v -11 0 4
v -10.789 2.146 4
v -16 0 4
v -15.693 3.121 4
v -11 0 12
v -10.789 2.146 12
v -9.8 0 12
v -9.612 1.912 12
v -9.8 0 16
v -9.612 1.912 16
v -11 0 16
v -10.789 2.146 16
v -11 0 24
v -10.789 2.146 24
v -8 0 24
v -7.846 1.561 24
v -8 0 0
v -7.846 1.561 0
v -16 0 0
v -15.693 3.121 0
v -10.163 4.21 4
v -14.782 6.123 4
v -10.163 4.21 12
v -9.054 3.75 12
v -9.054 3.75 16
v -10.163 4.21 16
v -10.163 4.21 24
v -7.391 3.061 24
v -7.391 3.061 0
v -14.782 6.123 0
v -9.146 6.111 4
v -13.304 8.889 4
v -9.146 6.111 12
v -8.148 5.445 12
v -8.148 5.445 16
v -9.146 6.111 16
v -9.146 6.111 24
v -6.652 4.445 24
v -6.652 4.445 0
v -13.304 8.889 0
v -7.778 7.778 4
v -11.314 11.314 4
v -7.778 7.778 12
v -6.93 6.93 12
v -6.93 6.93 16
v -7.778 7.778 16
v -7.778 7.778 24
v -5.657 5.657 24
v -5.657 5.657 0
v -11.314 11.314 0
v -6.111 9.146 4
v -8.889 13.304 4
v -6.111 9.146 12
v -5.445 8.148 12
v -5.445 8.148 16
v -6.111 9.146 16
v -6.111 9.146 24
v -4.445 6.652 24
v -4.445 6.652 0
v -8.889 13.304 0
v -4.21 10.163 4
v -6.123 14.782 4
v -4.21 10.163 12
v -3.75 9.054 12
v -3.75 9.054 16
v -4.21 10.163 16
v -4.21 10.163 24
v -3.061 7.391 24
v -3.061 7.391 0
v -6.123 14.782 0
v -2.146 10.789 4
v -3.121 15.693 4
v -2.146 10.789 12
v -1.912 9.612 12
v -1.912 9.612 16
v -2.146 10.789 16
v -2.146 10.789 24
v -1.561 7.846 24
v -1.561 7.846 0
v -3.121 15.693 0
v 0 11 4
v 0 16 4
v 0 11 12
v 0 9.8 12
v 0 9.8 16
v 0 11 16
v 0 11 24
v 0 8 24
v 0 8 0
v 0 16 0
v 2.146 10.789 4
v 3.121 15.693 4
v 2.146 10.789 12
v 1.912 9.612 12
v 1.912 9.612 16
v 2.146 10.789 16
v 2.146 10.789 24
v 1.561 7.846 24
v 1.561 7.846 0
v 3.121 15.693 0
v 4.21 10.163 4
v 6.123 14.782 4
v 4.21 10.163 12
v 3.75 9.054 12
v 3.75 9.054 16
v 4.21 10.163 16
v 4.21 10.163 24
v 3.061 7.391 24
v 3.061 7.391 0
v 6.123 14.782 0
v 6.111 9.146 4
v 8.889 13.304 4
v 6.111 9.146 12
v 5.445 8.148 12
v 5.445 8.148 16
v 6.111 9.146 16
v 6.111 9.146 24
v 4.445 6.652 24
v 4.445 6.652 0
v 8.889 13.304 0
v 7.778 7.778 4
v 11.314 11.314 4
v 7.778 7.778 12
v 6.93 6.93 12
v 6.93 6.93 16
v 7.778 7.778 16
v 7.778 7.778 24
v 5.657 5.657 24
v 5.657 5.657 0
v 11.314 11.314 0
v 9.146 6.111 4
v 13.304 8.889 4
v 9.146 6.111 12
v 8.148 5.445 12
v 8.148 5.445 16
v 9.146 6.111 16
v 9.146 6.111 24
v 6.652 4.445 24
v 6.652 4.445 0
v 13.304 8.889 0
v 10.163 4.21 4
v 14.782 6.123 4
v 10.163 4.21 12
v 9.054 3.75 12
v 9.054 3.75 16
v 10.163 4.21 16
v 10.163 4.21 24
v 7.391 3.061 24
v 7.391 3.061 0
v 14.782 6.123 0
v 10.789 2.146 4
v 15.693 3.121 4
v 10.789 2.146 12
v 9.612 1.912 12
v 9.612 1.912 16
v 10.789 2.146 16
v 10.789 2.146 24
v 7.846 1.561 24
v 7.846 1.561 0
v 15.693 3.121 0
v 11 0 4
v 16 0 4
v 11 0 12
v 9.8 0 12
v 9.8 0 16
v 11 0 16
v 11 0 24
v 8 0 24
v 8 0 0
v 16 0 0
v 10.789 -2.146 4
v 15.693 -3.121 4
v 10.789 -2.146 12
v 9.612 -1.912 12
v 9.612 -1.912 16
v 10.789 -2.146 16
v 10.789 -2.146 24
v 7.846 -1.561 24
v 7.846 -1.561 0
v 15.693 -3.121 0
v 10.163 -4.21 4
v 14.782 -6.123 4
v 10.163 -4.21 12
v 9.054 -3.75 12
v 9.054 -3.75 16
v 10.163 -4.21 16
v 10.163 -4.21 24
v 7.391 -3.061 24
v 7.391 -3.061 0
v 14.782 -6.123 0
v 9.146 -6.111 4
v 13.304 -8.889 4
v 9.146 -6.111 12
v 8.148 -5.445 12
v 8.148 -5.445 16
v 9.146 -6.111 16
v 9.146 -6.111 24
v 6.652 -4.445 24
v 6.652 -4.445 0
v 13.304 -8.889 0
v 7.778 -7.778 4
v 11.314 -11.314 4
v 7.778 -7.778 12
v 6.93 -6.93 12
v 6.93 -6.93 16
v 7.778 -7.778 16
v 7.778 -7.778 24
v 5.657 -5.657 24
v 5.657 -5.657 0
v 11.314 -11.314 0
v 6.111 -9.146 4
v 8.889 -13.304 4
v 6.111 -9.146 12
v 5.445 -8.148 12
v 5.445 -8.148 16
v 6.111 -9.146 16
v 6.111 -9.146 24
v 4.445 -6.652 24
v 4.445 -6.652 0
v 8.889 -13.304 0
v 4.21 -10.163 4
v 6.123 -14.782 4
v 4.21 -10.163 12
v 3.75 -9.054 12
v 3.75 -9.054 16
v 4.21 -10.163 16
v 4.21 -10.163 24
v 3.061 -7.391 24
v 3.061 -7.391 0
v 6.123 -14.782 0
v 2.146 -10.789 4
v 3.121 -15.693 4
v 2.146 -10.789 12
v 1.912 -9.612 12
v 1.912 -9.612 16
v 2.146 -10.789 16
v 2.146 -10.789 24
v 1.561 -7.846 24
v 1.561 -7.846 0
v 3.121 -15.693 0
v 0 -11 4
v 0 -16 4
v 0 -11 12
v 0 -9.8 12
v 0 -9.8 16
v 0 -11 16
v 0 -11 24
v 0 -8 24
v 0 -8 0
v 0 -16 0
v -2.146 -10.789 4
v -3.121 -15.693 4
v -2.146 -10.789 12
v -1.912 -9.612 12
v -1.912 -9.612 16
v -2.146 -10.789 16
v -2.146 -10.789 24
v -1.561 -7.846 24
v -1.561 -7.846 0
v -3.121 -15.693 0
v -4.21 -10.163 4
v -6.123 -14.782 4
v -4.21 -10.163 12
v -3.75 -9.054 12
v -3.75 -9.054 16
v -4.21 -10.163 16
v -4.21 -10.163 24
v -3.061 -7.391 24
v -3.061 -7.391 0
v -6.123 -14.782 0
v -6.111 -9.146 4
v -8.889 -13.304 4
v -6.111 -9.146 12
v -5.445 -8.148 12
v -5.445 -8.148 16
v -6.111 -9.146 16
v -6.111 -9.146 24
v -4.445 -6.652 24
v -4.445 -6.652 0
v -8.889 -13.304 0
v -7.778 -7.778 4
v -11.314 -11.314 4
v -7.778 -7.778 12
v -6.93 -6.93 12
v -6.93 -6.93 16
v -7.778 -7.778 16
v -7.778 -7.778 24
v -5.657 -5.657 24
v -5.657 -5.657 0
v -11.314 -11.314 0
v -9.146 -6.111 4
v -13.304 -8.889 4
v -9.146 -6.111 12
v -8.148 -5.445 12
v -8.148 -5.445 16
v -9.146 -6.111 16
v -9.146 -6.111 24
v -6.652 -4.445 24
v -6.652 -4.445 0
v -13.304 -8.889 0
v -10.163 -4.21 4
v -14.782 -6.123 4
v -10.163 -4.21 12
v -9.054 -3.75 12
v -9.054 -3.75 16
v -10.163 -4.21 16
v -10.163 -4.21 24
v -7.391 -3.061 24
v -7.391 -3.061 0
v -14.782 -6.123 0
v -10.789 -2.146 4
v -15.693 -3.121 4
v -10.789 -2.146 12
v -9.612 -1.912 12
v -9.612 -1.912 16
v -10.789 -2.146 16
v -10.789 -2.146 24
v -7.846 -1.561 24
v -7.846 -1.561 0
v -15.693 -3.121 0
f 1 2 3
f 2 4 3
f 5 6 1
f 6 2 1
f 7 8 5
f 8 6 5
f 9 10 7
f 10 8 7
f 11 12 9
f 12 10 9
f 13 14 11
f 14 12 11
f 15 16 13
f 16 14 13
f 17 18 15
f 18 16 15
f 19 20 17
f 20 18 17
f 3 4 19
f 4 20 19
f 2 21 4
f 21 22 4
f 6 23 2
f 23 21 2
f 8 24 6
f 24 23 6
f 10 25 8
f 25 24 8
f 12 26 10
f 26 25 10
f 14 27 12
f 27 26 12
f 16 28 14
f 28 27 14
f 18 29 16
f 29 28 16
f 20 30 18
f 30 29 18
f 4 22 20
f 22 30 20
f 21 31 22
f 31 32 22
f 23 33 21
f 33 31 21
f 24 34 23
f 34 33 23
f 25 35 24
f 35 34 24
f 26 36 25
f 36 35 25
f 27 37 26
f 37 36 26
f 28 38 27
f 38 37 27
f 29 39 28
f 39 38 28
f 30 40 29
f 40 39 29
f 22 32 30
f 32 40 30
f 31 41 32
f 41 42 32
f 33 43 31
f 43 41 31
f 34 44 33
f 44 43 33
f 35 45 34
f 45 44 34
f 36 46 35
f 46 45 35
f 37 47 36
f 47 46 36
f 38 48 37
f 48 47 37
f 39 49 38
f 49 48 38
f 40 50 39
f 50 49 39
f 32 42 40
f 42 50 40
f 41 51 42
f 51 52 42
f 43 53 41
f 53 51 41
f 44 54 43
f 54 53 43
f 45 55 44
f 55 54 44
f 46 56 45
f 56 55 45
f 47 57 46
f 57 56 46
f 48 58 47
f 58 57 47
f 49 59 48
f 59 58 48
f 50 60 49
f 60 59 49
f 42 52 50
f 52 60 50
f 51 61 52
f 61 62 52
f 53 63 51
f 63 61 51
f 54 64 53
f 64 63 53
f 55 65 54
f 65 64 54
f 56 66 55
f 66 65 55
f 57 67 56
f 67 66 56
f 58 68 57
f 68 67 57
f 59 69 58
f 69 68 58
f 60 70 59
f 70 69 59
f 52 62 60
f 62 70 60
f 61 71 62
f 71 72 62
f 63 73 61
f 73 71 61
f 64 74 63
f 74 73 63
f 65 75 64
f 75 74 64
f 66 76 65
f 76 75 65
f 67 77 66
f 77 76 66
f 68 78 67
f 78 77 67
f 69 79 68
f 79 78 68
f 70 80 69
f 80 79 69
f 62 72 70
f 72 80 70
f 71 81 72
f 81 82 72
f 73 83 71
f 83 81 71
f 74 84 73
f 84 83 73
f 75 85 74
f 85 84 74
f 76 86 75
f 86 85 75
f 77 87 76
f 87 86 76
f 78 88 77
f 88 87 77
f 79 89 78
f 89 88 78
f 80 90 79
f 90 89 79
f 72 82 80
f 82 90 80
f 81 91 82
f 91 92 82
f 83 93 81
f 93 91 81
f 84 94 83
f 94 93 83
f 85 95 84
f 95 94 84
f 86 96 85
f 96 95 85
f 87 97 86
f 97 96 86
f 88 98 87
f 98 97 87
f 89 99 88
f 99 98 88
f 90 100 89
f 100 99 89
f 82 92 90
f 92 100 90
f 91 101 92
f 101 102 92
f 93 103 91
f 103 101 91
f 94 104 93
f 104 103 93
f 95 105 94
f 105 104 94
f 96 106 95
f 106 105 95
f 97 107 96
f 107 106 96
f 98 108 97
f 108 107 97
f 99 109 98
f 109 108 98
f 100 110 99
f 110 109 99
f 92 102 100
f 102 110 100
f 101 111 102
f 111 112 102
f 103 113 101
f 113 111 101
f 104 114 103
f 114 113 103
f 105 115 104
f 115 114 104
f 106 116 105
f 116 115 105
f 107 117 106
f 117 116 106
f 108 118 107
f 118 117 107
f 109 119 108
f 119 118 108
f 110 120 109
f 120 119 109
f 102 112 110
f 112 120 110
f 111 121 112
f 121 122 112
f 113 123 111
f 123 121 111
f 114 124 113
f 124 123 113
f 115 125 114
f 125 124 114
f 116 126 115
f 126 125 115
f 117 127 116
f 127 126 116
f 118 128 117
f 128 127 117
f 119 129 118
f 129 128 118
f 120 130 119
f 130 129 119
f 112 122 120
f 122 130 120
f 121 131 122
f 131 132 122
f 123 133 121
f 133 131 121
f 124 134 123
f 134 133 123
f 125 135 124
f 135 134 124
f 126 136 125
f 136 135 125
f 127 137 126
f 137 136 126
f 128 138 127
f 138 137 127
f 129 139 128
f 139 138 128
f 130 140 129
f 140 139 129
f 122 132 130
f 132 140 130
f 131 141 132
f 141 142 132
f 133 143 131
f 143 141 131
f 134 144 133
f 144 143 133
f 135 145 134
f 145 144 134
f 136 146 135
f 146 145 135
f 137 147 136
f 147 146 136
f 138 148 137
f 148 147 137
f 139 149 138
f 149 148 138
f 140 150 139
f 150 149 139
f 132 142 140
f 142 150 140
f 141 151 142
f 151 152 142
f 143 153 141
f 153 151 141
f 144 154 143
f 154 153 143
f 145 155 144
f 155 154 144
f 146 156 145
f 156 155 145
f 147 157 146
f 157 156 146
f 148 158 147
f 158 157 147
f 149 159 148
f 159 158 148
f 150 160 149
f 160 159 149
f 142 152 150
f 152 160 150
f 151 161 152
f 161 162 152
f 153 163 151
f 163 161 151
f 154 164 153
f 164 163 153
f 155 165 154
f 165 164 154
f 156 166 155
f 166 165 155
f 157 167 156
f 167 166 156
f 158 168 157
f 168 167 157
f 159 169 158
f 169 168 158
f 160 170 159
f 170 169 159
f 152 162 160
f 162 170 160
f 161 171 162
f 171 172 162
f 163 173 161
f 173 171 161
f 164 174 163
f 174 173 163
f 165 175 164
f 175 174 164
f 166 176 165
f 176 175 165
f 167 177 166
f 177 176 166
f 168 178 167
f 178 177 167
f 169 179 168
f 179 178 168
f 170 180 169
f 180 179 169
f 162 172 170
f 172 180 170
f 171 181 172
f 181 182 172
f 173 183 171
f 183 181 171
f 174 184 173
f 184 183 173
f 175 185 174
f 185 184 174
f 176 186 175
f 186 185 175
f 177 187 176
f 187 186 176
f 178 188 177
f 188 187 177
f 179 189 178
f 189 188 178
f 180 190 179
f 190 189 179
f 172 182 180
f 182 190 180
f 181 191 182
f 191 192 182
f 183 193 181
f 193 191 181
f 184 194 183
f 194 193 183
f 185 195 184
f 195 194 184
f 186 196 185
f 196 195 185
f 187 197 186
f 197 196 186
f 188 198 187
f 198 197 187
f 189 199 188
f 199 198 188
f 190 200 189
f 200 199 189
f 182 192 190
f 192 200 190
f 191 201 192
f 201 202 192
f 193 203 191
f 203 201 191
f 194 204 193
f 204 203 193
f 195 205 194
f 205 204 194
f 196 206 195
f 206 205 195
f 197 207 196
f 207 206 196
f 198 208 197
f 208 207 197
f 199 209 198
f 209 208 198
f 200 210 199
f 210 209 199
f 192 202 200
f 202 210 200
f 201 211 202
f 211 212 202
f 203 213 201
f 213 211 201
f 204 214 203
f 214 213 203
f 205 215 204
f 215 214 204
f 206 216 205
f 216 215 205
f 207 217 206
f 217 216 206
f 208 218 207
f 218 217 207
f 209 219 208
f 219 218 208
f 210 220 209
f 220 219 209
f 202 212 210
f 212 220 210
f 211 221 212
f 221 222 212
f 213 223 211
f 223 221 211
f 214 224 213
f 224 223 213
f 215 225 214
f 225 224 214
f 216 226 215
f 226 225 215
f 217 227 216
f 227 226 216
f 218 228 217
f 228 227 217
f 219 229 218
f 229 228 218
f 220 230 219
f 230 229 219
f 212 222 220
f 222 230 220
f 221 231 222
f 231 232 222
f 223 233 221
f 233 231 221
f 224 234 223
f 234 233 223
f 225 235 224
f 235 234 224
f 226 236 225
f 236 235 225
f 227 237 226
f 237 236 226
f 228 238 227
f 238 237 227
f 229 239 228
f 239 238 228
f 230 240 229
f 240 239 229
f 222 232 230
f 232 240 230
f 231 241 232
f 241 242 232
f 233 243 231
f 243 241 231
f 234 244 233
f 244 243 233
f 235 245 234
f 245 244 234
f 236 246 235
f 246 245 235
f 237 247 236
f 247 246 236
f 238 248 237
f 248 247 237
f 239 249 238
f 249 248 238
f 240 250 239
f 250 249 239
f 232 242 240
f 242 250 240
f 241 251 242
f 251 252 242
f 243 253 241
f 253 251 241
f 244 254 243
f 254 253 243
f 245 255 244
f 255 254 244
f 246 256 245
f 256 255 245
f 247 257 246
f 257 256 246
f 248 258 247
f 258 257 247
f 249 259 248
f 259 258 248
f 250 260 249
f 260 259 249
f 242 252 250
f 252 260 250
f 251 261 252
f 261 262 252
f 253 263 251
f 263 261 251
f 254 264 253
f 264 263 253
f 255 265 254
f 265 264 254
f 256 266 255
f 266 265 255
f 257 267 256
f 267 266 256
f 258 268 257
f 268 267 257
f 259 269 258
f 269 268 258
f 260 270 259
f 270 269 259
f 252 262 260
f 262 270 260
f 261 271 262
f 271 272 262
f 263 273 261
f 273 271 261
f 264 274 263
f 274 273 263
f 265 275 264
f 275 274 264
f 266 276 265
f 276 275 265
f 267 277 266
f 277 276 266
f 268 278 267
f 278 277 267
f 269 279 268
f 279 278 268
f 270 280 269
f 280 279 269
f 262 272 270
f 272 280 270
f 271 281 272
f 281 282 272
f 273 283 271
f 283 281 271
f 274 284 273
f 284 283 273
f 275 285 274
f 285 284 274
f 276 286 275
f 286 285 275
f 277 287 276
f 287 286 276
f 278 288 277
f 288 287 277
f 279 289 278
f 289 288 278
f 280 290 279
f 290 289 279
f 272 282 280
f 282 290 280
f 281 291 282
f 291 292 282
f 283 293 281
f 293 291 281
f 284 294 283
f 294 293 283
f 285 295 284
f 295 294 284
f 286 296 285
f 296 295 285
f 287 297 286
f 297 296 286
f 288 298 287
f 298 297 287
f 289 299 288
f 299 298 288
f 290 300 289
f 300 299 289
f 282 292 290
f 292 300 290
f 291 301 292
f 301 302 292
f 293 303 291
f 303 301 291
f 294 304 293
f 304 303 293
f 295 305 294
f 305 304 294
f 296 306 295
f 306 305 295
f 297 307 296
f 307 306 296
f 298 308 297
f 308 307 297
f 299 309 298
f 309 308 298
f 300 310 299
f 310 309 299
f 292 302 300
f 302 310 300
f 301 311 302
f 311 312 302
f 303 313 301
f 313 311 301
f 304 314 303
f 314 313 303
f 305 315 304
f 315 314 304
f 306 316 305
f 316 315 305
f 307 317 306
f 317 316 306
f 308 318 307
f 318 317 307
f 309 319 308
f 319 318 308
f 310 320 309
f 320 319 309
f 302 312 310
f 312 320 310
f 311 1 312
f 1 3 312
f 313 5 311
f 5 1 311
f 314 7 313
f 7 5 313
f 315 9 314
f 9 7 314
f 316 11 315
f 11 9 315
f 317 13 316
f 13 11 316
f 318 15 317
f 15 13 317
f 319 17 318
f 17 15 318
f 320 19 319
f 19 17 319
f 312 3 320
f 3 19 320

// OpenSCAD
$fn = 32;

// ----------------------------------------------------------------------
// Grooved revolve: flanged, bore R8
// ----------------------------------------------------------------------

// --- parameters (mm) ---
bore_r = 8;               // bore radius
outer_r = 11;             // outer radius of the body
total_h = 24;             // overall height, Z
wall = 3;                 // radial wall thickness
groove_w = 4;             // groove width
groove_d = 1.2;           // groove depth
grooves = 1;              // number of outer grooves
flange_r = 16;            // flange radius
flange_h = 4;             // flange height

bbox_x = 2 * flange_r;  // full diameter
bore_d = 2 * bore_r;  // bore diameter
body_d = 2 * outer_r;  // body diameter
flange_d = 2 * flange_r;  // flange diameter
revolve_angle = 360;  // full turn around the Z axis

profile = [[8, 0], [11, 0], [16, 0], [16, 4], [11, 4], [11, 12], [9.8, 12], [9.8, 16], [11, 16], [11, 24], [8, 24]];  // primary outline, 11 points, counter clockwise

// --- the one profile operation ---
rotate_extrude(angle = revolve_angle) polygon(points = profile);
